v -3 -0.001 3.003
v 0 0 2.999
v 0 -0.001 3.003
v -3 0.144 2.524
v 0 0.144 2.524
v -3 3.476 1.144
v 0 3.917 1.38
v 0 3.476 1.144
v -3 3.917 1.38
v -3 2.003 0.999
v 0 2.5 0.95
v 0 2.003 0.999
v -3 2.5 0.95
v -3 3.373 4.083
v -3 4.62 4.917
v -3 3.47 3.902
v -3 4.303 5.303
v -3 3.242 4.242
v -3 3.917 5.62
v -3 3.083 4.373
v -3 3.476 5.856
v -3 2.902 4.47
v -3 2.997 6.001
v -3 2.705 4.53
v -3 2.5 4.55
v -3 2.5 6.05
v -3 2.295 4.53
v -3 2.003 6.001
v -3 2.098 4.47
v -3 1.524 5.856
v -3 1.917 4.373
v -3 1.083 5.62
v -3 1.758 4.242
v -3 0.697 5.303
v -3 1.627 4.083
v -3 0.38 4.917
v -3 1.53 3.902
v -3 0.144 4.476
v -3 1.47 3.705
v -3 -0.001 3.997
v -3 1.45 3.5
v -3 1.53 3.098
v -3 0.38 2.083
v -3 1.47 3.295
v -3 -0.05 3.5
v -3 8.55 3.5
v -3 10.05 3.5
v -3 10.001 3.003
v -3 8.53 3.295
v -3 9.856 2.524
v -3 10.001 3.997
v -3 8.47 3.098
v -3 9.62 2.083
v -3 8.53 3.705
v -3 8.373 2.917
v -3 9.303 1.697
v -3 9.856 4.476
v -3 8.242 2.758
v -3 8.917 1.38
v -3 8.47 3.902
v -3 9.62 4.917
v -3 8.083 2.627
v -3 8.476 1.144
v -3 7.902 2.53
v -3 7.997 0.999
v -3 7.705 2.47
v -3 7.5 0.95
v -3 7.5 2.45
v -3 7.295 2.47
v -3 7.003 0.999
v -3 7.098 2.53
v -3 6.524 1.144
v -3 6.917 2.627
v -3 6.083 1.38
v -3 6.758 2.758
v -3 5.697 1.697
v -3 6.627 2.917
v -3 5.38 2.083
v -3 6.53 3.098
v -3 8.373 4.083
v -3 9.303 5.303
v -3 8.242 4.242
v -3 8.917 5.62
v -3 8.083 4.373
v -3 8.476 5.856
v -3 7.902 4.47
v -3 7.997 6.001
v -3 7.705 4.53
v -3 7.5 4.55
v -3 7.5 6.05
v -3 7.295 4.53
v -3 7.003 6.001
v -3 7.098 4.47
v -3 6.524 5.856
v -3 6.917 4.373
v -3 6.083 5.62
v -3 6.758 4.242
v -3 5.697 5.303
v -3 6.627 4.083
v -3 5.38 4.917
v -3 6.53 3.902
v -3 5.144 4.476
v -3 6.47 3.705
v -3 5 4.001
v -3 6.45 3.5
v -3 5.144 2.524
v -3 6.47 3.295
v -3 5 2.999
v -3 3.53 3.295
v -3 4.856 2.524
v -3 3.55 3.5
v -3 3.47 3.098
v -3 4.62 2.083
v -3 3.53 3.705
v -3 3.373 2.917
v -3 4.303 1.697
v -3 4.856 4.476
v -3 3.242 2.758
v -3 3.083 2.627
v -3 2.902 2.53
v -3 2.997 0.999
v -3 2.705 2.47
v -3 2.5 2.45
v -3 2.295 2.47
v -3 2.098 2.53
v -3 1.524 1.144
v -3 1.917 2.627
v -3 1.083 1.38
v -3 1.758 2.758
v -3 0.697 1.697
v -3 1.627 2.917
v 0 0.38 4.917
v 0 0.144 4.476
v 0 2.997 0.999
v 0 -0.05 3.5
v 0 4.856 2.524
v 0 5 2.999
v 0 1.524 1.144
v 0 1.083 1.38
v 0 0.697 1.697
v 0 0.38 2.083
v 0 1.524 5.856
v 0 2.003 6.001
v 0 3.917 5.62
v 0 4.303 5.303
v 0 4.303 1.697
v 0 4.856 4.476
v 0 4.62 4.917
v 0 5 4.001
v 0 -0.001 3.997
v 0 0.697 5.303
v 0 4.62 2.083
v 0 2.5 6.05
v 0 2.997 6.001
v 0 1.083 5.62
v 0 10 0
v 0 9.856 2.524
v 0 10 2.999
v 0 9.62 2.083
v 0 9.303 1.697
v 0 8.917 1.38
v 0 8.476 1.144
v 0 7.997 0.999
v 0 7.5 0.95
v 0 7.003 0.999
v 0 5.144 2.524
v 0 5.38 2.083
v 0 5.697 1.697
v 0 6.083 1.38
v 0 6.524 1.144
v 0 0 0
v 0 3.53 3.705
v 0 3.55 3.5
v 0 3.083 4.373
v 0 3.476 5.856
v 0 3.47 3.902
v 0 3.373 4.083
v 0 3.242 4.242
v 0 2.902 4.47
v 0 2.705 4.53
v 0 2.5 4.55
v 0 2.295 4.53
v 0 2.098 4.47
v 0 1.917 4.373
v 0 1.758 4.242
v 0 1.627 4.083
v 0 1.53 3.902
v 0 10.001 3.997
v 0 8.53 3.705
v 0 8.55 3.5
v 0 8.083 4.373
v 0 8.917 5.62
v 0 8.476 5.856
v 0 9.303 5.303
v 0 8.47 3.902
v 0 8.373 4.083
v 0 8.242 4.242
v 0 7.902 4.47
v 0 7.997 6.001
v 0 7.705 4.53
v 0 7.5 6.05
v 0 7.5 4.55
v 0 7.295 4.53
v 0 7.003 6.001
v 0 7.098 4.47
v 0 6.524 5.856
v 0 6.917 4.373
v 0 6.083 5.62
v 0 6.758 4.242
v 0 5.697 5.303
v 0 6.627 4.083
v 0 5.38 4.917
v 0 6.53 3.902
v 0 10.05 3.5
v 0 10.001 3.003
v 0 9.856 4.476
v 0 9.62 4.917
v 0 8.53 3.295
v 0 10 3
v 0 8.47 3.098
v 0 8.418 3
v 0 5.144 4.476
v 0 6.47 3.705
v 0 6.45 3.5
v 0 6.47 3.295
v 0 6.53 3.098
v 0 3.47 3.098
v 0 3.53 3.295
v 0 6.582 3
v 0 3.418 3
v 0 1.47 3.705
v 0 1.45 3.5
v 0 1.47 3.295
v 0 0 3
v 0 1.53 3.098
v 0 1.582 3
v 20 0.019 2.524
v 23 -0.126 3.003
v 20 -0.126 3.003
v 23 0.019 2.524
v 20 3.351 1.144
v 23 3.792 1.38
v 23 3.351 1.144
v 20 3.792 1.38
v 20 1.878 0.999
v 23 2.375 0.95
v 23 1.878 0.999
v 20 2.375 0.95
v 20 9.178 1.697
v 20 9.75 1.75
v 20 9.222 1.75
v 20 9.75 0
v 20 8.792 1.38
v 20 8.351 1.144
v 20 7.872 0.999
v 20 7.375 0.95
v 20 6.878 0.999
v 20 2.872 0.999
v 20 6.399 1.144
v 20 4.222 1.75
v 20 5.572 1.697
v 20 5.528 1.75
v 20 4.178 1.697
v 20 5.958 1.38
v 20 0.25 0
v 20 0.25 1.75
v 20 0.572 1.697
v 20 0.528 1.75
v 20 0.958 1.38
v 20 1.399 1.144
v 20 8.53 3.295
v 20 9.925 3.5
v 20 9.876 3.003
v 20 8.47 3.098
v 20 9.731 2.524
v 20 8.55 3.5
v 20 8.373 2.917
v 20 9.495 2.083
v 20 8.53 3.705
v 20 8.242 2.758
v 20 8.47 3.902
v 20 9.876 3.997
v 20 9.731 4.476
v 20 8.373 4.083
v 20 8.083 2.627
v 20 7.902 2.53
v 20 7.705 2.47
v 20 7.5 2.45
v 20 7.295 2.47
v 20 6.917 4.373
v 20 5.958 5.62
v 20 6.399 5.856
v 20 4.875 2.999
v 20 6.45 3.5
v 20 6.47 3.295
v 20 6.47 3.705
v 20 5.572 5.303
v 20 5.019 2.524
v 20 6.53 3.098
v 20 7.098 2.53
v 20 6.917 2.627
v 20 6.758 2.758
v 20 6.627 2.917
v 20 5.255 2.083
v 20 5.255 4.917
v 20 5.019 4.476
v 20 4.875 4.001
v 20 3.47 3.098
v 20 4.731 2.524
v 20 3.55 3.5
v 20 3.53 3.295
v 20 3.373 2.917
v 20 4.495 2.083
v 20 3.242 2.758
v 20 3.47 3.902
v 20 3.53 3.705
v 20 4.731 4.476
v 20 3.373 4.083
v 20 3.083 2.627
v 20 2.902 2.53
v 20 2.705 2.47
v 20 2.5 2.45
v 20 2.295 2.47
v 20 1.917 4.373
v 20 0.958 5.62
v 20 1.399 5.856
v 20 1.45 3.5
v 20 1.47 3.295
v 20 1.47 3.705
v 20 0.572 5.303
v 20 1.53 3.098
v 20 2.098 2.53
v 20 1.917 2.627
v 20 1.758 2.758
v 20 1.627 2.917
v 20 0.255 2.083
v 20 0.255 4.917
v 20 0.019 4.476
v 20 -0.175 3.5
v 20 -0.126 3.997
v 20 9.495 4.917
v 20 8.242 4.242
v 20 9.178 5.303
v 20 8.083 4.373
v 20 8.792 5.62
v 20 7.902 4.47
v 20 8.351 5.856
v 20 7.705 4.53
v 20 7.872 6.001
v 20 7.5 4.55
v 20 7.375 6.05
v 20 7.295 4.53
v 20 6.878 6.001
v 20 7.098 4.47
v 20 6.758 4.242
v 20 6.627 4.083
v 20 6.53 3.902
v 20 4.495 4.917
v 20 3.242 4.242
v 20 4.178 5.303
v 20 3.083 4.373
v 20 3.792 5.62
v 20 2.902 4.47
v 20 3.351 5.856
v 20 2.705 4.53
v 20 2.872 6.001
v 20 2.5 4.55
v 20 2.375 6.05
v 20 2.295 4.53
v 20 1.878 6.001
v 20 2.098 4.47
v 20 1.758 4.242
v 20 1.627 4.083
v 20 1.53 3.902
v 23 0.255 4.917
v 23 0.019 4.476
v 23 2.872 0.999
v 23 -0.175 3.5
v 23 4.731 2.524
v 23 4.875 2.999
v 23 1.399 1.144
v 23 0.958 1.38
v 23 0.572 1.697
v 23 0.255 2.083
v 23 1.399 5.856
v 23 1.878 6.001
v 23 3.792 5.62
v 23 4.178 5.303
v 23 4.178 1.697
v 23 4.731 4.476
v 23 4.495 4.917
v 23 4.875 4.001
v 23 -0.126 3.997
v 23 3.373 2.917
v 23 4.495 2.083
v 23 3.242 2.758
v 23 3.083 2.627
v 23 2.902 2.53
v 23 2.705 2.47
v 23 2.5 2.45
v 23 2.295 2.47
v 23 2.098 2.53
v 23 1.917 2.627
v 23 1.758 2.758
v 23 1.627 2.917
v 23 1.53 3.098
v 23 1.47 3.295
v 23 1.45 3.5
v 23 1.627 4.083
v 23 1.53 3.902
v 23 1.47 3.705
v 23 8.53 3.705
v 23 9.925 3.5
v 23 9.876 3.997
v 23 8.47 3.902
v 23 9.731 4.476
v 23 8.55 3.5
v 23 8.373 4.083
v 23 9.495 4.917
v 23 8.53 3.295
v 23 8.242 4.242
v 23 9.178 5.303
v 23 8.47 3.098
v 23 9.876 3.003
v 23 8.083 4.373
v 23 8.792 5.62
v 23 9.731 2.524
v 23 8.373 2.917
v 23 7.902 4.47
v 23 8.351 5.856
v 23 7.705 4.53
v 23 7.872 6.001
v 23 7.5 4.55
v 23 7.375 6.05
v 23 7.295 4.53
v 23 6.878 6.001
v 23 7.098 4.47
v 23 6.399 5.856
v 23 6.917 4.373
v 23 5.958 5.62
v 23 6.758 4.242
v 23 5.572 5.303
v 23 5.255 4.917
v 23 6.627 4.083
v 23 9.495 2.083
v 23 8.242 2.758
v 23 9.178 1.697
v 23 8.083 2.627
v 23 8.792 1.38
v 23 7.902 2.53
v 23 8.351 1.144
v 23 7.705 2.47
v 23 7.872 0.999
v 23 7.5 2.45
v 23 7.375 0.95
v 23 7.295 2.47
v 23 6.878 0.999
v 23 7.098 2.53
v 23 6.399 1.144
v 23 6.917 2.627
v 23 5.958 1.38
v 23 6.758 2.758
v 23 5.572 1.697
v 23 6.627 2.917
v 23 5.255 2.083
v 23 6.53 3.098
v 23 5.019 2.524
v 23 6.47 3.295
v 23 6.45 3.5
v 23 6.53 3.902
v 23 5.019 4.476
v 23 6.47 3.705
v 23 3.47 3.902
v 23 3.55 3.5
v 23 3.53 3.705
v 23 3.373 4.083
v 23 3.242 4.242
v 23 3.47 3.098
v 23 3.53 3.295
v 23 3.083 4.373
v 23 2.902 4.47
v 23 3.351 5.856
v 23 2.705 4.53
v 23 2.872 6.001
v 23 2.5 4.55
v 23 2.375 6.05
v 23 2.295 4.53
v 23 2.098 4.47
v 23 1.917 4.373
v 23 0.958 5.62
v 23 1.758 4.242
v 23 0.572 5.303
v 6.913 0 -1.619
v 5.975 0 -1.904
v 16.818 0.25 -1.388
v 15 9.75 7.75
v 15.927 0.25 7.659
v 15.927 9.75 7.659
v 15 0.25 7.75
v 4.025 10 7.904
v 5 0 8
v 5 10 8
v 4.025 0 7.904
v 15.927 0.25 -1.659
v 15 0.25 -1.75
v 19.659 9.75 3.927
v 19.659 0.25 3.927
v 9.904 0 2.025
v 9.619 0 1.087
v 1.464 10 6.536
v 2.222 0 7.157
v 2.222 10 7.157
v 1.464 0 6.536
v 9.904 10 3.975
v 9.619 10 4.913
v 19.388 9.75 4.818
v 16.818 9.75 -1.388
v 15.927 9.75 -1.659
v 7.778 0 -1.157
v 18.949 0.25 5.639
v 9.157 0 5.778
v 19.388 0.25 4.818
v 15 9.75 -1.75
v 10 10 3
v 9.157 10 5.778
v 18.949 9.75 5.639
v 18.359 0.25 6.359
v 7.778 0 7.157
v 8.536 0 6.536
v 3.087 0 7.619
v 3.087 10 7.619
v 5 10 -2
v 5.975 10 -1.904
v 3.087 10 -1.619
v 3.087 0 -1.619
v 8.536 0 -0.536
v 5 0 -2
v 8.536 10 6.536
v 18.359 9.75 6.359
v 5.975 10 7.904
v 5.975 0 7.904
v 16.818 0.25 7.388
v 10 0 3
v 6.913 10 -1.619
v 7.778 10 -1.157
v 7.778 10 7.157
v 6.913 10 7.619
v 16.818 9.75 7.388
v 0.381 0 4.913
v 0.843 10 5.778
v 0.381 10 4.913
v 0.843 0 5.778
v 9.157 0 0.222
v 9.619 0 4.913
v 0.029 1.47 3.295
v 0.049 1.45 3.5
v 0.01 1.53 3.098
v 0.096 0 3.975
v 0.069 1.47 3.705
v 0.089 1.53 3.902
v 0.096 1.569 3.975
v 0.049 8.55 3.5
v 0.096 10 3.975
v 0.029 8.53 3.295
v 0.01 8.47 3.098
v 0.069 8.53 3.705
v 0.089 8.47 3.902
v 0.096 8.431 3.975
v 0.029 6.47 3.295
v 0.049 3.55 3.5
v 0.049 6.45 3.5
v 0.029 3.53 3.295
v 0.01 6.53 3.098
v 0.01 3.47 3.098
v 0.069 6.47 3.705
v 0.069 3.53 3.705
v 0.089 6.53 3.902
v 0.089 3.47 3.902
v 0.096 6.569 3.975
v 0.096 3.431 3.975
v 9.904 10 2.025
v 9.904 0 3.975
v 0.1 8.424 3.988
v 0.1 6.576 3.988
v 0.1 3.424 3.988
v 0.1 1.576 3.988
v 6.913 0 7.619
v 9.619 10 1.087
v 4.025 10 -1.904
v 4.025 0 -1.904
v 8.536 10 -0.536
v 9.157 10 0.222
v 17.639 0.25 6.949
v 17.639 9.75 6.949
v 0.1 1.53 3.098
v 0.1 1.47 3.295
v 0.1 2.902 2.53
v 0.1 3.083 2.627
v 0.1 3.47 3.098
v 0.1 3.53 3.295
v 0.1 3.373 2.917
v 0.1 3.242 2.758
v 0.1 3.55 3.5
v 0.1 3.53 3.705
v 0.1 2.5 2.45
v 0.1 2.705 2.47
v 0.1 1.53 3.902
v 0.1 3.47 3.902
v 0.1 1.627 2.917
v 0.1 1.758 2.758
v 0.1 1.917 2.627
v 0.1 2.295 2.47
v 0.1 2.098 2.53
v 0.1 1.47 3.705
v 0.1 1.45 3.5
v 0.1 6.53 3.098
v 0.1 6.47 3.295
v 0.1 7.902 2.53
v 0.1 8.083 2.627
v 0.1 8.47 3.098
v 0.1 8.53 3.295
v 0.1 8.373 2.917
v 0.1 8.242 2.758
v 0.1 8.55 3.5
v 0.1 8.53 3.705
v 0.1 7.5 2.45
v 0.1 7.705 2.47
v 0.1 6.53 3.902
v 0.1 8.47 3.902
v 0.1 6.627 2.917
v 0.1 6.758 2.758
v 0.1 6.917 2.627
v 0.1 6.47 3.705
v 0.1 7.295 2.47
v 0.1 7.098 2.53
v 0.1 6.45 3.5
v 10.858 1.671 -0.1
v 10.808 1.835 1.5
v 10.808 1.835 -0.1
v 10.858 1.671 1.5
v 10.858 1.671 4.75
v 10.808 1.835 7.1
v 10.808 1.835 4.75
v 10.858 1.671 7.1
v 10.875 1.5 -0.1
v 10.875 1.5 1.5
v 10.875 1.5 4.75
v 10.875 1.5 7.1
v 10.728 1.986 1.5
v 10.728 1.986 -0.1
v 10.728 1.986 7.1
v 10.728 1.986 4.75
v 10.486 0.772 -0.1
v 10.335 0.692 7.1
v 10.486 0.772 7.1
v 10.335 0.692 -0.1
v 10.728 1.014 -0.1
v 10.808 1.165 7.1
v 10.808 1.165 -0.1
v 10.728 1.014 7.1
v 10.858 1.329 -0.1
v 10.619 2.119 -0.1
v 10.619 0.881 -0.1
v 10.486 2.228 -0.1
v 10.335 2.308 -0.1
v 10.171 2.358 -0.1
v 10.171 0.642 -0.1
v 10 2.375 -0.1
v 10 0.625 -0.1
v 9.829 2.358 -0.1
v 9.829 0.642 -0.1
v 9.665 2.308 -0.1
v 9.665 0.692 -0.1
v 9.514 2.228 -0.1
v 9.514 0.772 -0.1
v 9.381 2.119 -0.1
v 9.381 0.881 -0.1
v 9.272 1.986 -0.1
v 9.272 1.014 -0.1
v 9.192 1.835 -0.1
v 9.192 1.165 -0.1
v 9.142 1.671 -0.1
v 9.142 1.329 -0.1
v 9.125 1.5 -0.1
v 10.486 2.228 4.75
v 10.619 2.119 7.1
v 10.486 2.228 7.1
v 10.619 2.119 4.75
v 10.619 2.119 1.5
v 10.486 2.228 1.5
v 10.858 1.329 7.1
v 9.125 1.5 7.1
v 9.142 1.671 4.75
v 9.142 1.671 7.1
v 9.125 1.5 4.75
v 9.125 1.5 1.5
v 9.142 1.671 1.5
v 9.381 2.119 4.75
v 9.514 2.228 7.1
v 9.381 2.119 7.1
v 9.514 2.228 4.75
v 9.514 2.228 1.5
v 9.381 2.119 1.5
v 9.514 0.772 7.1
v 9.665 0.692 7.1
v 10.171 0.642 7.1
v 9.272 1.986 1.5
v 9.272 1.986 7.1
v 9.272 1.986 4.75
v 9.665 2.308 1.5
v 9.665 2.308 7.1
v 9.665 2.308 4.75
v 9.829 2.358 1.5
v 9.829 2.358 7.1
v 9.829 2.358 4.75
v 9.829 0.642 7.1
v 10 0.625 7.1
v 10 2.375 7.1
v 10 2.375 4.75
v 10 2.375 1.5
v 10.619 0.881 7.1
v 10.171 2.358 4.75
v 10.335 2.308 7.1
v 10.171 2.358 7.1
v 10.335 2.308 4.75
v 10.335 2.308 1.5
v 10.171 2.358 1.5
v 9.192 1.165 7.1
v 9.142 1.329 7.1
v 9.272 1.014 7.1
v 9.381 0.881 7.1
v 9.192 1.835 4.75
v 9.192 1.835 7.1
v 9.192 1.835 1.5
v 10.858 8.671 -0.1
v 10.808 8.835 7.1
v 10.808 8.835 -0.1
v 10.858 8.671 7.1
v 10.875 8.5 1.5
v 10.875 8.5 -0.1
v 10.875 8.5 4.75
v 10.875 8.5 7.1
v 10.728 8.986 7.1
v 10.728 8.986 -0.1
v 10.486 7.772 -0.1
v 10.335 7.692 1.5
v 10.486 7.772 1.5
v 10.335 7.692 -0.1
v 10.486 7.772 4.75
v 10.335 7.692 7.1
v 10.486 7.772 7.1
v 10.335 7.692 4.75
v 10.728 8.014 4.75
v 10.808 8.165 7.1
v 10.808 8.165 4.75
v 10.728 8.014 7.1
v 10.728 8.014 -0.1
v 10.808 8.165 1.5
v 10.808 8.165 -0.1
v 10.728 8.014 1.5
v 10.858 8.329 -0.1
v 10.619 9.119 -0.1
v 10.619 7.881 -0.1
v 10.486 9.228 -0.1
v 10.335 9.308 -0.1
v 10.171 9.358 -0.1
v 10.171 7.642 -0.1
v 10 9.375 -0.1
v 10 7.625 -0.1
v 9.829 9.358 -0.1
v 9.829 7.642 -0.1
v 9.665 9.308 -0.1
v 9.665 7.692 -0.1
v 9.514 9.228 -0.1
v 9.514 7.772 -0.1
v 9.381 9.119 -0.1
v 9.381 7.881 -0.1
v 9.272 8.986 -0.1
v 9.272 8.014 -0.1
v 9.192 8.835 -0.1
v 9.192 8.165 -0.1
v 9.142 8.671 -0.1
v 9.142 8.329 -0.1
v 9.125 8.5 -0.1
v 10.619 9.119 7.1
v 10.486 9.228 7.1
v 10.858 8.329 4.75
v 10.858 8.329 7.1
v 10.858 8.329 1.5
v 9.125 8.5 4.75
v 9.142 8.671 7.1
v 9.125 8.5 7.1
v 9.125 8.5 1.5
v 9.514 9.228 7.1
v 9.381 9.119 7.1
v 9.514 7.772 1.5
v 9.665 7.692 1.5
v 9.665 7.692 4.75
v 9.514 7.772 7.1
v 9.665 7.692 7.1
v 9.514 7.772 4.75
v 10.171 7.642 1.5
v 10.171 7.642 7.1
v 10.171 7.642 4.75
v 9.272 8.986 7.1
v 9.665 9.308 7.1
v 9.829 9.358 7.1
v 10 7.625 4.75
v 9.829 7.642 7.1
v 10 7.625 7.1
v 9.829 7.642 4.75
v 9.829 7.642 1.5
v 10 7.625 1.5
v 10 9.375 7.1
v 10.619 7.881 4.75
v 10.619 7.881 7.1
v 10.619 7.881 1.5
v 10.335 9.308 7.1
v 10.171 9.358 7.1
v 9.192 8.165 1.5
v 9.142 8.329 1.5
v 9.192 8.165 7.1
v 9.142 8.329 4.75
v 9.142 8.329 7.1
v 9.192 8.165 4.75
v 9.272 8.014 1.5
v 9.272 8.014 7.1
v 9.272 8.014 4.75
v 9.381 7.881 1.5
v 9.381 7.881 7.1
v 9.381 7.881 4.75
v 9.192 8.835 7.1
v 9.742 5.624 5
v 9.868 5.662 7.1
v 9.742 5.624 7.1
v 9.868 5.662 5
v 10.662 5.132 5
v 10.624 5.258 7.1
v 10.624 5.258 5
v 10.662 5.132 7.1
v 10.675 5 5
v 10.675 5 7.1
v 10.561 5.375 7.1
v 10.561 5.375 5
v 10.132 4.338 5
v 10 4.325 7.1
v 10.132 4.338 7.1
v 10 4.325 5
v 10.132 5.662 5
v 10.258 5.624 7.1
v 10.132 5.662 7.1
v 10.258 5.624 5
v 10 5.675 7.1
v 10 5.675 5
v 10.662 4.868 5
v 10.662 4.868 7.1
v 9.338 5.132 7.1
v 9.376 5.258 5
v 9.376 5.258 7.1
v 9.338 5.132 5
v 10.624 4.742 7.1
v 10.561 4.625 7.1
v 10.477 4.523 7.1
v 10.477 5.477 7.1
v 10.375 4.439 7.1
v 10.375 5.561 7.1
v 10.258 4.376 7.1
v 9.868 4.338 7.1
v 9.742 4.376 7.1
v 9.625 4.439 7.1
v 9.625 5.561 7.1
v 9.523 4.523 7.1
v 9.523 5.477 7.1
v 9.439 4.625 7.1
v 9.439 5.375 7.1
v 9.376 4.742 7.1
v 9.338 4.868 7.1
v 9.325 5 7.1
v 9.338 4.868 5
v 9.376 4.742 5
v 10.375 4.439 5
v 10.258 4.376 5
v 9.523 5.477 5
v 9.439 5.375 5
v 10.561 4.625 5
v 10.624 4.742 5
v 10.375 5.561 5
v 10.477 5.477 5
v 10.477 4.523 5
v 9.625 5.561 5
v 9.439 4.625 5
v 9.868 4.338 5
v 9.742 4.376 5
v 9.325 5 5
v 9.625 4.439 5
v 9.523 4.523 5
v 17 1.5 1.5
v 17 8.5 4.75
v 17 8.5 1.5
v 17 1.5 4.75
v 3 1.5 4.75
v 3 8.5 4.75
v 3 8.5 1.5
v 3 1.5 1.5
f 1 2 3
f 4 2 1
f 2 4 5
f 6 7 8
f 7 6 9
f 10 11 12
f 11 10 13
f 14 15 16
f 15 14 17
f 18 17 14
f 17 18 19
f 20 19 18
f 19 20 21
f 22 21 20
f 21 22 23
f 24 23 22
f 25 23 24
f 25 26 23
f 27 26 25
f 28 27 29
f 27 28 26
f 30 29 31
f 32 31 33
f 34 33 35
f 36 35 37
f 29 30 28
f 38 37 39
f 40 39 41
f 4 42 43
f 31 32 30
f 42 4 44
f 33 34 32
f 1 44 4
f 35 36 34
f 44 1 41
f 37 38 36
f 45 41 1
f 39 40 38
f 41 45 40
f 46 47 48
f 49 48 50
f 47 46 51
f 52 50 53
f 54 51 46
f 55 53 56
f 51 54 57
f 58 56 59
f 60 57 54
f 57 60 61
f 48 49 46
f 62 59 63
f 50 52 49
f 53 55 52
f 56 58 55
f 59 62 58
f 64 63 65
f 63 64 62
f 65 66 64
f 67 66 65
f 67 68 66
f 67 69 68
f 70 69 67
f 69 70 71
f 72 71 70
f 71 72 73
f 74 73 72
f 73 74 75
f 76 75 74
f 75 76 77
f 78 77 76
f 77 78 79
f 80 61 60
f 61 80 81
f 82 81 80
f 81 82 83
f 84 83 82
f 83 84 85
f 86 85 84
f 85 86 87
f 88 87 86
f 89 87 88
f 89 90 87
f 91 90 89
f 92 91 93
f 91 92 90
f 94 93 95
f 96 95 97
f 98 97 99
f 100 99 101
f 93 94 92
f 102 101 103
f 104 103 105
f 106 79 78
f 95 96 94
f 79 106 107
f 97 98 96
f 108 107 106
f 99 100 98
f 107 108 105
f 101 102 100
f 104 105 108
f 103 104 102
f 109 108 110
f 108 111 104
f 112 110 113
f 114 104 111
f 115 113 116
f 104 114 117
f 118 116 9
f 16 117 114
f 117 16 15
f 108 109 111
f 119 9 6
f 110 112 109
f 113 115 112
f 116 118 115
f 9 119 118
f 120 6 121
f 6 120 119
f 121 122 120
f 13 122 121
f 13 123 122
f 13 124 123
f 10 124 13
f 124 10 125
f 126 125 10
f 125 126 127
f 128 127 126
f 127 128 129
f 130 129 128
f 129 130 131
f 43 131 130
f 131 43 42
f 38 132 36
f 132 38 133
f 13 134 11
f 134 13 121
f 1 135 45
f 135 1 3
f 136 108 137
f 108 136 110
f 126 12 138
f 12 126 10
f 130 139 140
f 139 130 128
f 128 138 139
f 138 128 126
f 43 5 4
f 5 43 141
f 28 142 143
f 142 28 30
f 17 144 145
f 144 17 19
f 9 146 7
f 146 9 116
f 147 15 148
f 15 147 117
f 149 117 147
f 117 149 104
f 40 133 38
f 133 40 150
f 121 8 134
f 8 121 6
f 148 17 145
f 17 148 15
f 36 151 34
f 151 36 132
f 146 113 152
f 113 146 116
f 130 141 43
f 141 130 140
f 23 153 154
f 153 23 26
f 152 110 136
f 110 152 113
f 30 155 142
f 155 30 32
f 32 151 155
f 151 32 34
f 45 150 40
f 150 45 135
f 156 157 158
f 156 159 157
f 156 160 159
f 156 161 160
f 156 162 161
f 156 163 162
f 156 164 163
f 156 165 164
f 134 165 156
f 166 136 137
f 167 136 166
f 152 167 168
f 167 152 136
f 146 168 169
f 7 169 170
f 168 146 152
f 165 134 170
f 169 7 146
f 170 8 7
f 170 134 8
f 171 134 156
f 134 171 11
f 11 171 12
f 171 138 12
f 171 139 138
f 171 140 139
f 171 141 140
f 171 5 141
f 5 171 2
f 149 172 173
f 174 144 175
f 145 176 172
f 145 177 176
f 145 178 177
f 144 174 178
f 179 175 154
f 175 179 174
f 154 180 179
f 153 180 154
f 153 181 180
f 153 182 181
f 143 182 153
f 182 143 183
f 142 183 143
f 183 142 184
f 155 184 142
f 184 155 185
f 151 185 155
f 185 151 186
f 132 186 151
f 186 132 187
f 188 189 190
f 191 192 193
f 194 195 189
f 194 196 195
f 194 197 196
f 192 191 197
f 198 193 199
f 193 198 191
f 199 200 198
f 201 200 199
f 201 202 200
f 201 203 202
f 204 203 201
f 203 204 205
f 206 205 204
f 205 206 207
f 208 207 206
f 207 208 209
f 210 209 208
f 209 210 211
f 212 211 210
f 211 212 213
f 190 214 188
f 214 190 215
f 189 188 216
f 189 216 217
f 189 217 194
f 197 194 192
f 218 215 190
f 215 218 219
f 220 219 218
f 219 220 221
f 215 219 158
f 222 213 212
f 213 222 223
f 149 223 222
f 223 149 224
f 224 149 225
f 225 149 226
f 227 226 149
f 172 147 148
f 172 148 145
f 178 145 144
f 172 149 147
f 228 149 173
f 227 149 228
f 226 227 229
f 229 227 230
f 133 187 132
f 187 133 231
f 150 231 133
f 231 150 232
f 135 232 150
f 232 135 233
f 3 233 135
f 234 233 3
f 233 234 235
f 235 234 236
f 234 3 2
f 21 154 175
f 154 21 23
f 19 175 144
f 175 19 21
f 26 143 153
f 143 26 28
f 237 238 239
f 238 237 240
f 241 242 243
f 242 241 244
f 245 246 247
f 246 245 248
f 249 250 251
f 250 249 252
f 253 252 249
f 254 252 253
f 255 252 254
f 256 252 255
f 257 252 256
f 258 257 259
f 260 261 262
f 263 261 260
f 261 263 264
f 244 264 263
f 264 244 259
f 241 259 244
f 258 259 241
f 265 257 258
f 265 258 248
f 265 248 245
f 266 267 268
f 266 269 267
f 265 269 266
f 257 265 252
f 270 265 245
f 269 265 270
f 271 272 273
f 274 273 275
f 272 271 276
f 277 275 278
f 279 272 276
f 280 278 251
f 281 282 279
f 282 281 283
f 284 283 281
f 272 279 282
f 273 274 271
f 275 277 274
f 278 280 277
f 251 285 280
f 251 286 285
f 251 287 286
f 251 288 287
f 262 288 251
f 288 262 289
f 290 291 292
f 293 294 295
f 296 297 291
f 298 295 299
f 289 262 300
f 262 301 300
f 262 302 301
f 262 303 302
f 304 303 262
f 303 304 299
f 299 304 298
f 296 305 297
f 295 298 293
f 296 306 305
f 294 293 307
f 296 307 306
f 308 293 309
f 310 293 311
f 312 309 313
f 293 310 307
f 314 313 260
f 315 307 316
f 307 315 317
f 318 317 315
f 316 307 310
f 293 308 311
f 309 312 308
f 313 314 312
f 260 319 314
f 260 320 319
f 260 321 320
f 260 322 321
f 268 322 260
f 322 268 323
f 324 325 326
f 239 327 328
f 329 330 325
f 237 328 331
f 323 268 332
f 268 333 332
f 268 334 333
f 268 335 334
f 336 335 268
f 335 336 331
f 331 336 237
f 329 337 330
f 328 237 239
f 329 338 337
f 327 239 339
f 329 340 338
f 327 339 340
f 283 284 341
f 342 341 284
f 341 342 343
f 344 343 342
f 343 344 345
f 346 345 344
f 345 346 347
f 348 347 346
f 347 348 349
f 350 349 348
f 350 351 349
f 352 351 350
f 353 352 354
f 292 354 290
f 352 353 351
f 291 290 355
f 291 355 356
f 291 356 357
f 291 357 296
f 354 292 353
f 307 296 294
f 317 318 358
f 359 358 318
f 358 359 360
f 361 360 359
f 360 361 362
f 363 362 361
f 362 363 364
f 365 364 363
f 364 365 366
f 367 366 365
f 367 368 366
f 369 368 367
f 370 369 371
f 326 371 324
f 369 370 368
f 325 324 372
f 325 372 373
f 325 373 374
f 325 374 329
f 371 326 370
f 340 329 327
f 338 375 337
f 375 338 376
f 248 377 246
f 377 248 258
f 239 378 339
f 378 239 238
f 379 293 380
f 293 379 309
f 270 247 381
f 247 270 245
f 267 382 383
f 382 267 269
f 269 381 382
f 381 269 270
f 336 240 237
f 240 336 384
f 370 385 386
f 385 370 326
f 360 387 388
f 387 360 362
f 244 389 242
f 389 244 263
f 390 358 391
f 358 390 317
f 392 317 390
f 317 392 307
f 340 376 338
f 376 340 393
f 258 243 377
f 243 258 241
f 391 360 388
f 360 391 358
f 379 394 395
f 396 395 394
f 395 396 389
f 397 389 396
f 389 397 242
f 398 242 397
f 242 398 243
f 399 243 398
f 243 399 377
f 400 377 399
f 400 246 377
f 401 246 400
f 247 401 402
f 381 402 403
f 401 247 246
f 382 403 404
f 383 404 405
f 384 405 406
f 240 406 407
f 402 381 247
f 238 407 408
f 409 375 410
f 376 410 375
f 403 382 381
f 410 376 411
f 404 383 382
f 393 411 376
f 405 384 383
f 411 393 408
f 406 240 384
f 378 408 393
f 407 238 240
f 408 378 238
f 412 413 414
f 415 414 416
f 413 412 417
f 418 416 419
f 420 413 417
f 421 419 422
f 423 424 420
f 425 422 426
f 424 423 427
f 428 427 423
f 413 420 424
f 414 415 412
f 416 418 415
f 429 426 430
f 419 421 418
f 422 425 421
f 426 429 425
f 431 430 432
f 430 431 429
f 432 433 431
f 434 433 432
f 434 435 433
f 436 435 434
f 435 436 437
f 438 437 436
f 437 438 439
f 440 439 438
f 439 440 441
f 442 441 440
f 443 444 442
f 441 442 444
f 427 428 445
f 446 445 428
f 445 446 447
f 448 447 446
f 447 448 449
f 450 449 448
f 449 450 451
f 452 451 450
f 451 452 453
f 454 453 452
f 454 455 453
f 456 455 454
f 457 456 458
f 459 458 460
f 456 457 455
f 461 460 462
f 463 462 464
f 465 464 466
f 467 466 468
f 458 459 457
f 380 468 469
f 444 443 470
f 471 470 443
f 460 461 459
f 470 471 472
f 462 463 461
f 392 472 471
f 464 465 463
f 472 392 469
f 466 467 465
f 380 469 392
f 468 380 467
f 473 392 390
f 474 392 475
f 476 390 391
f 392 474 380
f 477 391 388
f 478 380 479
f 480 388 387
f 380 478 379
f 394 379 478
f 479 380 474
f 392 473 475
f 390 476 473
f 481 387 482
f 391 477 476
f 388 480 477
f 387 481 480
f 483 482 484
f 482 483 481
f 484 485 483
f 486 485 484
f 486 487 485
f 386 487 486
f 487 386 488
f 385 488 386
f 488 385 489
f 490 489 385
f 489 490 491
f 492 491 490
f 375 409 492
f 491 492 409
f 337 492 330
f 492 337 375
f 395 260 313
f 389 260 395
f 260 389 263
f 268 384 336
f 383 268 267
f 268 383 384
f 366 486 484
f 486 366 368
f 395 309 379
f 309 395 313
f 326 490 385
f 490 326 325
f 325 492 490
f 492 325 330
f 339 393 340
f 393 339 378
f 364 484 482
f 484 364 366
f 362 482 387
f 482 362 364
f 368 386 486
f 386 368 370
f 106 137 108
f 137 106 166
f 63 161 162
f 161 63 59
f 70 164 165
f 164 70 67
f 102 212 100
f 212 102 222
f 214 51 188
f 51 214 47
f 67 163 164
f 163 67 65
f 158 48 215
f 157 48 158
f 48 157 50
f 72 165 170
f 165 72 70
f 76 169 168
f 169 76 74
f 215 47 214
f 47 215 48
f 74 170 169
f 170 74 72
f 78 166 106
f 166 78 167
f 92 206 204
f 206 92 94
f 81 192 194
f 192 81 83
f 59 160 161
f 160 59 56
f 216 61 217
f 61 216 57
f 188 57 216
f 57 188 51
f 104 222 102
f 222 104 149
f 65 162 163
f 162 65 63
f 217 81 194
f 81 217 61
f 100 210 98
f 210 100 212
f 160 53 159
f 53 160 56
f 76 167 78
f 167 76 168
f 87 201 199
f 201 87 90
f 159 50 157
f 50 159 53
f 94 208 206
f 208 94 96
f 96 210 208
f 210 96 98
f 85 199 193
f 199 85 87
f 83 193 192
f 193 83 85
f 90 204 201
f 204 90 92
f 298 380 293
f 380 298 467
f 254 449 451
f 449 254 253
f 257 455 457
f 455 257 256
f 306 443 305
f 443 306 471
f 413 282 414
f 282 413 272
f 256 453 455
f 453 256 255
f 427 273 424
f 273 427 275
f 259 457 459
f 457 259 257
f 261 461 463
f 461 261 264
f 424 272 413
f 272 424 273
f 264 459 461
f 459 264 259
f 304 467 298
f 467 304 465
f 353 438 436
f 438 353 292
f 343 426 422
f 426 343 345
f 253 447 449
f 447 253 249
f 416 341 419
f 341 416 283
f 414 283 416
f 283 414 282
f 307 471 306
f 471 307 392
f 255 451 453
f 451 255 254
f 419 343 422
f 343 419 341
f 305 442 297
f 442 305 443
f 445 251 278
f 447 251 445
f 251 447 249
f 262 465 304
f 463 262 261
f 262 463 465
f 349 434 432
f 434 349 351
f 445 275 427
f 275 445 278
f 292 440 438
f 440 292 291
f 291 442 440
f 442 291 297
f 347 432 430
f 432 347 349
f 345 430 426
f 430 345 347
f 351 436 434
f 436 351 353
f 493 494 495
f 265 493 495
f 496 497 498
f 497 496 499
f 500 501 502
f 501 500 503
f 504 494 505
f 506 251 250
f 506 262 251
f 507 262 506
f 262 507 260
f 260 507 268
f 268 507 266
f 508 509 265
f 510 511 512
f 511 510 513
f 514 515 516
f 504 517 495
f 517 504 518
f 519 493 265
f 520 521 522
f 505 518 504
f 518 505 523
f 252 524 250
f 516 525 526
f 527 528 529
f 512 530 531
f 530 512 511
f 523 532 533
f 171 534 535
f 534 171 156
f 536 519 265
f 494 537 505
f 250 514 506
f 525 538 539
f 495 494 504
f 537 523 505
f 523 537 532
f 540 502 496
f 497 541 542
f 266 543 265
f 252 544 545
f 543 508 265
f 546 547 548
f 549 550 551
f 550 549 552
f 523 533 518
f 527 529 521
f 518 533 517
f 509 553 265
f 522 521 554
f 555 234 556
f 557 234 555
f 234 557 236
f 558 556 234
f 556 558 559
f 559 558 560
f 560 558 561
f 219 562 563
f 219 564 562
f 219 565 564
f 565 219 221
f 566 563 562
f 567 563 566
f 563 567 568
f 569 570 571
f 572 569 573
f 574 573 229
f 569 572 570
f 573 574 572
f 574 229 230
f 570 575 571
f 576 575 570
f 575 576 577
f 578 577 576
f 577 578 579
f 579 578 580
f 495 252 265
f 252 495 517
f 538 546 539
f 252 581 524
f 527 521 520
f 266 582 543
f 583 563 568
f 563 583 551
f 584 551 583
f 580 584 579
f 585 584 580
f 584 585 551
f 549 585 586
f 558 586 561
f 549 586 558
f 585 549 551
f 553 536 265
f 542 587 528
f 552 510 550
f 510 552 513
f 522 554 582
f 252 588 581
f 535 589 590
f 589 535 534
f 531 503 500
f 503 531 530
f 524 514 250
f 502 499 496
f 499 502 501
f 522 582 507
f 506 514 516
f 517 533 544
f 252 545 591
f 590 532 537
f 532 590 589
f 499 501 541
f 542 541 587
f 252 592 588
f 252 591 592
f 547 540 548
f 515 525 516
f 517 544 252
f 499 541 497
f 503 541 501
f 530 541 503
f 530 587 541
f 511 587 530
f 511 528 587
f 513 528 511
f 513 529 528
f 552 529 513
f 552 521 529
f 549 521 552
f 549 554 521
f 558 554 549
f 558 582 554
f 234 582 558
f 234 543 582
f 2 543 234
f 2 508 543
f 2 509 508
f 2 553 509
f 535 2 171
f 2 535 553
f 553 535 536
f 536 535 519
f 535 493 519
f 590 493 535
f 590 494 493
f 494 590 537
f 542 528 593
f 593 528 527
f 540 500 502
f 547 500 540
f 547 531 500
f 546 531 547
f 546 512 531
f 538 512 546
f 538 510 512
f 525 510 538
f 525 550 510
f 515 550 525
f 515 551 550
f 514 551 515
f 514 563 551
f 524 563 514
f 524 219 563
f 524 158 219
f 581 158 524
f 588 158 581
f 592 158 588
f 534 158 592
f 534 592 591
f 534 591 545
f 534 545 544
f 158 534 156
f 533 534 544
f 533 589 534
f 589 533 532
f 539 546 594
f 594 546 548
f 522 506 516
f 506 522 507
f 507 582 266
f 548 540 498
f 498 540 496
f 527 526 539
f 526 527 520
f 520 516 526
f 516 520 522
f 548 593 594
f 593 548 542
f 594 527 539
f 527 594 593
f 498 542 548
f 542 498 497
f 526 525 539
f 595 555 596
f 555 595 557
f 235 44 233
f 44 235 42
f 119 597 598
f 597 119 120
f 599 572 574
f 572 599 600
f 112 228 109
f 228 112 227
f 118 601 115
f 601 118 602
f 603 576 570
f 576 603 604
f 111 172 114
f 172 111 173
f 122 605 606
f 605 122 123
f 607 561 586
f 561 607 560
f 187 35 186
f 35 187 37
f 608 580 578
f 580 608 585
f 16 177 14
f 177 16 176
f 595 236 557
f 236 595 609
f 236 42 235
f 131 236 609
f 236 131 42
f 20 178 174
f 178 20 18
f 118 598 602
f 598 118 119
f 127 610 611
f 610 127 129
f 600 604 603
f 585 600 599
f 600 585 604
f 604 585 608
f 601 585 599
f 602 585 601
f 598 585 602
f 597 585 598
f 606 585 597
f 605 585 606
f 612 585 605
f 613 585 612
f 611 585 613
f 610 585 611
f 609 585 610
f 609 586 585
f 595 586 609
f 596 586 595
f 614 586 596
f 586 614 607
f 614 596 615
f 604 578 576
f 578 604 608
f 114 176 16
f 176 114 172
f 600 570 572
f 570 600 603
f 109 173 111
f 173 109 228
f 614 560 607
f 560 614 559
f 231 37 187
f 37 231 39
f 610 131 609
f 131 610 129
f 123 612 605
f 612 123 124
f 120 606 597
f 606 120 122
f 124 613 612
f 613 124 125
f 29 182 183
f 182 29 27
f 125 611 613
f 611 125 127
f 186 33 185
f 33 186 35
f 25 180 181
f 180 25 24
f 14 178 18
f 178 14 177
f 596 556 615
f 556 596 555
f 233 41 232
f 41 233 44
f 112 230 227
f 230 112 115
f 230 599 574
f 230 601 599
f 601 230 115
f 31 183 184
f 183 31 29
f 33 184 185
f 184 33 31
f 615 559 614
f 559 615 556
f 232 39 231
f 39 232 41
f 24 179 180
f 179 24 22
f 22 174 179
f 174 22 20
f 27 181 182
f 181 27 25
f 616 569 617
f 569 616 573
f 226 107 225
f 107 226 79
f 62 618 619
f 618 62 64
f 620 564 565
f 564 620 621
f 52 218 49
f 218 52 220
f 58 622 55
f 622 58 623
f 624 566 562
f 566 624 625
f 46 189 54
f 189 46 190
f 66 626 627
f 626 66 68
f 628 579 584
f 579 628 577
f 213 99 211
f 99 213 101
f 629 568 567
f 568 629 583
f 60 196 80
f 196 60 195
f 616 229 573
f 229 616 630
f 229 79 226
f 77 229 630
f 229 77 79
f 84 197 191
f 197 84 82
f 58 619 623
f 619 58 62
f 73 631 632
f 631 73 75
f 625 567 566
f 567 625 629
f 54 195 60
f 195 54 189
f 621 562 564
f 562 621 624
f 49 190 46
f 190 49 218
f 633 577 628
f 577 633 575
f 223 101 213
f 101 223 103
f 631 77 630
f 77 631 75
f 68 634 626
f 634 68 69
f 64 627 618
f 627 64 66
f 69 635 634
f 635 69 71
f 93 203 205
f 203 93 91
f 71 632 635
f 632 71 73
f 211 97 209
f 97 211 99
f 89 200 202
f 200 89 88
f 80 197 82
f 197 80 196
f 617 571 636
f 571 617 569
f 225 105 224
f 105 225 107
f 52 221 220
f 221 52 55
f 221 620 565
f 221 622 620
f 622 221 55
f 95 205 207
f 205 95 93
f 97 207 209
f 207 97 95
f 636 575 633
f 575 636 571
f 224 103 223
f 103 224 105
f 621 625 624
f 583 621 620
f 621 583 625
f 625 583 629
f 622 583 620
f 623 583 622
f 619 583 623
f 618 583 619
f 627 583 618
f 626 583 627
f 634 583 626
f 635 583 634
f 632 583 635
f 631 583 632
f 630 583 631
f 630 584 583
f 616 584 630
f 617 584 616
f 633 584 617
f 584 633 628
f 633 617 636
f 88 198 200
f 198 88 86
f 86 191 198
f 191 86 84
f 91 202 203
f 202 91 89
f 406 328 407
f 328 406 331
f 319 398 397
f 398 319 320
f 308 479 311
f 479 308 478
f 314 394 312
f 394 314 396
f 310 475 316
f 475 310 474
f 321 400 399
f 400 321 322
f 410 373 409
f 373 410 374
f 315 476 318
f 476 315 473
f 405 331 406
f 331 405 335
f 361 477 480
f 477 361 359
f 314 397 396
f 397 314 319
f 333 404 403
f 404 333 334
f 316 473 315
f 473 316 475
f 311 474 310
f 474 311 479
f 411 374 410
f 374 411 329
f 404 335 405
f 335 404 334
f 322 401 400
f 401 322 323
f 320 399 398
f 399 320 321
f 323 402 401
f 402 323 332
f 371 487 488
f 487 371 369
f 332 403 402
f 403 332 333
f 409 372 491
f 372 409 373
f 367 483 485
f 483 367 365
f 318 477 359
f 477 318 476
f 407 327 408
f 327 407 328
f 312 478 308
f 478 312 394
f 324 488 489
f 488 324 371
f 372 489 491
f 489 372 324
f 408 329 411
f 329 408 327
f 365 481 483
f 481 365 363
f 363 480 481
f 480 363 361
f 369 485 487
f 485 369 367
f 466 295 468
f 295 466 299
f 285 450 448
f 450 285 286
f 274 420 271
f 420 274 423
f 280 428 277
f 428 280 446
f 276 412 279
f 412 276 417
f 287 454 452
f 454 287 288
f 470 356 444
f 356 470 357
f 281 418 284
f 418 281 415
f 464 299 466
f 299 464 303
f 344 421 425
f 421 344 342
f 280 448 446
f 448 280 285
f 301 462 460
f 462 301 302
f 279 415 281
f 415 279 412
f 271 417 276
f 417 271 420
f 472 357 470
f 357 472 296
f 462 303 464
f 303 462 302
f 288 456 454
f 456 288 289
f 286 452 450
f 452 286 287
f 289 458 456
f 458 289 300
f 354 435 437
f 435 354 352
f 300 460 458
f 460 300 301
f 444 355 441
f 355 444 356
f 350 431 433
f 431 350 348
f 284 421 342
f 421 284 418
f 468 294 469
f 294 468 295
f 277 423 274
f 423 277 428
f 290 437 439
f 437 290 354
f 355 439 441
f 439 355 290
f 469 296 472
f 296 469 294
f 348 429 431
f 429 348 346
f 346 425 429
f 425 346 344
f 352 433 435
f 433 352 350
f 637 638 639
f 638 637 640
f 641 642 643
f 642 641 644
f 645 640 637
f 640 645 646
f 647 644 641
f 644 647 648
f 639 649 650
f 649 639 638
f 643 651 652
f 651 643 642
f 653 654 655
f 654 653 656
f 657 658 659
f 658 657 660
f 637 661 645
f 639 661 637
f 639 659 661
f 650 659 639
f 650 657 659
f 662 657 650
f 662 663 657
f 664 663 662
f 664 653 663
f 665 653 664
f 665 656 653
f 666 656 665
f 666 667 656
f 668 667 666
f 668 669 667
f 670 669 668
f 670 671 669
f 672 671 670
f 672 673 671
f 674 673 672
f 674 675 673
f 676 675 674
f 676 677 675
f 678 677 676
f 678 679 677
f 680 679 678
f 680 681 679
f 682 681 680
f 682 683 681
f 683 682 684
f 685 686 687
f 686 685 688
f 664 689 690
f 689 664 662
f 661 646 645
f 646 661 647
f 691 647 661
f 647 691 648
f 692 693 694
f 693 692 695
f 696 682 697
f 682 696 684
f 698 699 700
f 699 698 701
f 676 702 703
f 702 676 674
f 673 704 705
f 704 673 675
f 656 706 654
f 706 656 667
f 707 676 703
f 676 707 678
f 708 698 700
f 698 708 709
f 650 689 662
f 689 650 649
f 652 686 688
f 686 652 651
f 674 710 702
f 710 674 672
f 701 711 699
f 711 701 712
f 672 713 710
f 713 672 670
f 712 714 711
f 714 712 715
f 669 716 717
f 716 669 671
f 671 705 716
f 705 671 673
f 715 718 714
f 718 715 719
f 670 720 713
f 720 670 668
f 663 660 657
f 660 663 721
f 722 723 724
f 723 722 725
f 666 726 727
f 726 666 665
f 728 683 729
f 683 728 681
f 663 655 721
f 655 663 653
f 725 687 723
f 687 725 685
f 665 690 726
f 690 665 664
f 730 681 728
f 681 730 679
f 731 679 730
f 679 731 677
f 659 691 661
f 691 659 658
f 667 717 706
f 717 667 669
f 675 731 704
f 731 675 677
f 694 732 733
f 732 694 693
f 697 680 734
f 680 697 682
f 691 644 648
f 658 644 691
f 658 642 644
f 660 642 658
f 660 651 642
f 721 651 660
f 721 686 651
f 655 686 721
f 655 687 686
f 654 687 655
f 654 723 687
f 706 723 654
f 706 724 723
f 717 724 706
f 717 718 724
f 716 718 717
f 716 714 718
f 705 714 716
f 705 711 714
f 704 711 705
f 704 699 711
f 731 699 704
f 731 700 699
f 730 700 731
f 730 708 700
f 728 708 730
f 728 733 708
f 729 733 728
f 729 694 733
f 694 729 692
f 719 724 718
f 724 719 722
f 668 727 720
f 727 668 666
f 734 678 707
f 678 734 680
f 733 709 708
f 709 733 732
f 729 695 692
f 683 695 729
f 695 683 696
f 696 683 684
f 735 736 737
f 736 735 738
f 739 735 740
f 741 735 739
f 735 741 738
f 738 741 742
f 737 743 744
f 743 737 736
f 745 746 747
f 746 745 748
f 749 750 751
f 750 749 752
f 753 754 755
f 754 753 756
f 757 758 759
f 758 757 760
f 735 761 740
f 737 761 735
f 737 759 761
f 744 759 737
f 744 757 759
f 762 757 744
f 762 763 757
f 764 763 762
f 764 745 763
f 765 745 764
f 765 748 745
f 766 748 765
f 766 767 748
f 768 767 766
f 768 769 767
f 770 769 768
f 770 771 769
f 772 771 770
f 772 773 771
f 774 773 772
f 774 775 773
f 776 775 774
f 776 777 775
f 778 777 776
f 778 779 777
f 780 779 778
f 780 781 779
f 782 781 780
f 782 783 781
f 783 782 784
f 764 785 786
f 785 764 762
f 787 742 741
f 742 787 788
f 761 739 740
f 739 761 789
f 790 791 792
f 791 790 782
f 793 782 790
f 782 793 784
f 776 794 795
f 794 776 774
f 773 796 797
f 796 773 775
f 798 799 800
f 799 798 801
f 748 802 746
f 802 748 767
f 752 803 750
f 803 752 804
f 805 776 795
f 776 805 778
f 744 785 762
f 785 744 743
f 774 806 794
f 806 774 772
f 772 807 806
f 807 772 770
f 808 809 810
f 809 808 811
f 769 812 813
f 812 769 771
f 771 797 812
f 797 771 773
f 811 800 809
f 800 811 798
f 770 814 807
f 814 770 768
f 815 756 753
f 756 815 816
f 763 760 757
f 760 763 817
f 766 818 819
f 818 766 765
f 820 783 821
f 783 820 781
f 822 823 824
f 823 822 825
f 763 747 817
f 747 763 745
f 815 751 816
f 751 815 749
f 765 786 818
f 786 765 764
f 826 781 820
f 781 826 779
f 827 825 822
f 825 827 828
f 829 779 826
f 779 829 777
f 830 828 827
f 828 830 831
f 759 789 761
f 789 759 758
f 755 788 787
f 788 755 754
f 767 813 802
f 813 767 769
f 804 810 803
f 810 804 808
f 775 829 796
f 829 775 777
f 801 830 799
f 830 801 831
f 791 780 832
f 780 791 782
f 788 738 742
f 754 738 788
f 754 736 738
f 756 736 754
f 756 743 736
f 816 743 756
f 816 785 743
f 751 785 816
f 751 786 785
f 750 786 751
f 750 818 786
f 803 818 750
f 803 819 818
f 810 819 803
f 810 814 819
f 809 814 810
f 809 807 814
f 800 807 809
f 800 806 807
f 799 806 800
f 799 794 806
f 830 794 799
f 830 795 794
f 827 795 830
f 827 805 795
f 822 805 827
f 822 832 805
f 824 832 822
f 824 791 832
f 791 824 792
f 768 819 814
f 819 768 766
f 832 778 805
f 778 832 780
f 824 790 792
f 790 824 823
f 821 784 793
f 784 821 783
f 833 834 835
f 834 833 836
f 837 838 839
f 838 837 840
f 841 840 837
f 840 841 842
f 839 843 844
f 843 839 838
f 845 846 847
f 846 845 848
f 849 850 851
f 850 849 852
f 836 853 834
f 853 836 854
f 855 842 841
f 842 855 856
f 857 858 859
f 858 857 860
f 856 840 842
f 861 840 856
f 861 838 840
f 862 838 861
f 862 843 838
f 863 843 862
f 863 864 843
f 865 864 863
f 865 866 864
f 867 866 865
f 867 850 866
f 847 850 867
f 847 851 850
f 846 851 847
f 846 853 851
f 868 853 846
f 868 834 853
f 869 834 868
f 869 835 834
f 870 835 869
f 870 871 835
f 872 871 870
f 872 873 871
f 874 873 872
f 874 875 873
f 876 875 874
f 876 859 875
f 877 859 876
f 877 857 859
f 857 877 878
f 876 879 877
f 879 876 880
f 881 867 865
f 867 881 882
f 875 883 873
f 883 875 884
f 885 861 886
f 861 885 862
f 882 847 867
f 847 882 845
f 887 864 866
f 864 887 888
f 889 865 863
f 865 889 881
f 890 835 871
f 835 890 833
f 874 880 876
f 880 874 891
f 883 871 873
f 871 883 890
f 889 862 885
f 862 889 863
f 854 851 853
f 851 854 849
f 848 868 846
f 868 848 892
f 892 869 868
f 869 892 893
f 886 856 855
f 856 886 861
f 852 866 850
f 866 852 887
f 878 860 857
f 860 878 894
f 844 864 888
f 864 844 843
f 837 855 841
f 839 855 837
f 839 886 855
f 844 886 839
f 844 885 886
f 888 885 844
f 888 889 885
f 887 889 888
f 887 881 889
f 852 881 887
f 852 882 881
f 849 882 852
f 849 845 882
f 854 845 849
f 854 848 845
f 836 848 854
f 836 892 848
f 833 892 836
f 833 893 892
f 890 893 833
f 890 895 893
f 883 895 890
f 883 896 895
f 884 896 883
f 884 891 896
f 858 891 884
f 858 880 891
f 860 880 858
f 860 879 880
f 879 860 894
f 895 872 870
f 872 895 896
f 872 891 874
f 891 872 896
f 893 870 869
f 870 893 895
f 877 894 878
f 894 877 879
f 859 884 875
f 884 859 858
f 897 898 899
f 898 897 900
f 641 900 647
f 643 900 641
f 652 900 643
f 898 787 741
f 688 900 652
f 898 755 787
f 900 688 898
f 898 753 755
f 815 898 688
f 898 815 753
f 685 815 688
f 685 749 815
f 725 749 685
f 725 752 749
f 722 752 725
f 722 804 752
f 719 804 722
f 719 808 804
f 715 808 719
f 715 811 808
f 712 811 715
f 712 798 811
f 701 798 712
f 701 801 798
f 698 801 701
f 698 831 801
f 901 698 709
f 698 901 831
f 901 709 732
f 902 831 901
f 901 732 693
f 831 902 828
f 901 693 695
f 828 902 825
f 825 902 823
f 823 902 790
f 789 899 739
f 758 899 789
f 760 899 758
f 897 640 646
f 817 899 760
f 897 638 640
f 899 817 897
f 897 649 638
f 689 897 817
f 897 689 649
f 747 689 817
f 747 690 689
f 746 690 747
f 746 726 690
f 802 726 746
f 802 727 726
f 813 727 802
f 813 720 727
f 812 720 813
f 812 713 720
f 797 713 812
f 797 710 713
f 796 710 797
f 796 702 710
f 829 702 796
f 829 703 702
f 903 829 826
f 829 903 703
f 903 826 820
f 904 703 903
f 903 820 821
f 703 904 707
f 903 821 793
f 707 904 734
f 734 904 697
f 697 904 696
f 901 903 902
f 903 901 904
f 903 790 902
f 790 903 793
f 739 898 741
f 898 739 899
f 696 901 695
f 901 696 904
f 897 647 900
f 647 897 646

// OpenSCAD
// ============================================================
// finger_segment_middle.scad
// Middle Finger Segment – Humanoid Welcoming Robot
// Identical geometry to proximal but with tapered/reduced mass
//
// Print Settings:
//   Material:    PLA
//   Infill:      15%
//   Layer height: 0.2 mm
//   Supports:    None required
//   Weight:      ~3 g
//   Print time:  ~2.5 minutes
// ============================================================

$fn = 32;
$fa = 6;
$fs = 1;

// --- Parametric Variables ---
length                = 20;   // mm  segment length
width                 = 10;   // mm  segment width
thickness             = 7;    // mm  segment thickness
hinge_pin_diameter    = 2;    // mm  hinge pin outer diameter
hinge_pin_bore        = 2.1;  // mm  hinge hole diameter (0.1 mm tolerance)
tendon_hole_diameter  = 1.35; // mm  tendon hole (top face)
elastic_hole_diameter = 1.75; // mm  elastic band holes (bottom face)
elastic_hole_spacing  = 7;    // mm  distance between two bottom holes
outer_radius          = 5;    // mm  dorsal curvature radius
wall_min              = 1.5;  // mm  minimum wall thickness

// Taper: middle segment is slightly narrower at the distal end
taper_amount = 0.5;           // mm  width reduction at distal end

// Derived
hinge_boss_od    = hinge_pin_bore + wall_min * 2;
hinge_boss_depth = 3.0;

// ============================================================
// Module: segment_body_tapered
// Slightly tapered body for reduced mass
// ============================================================
module segment_body_tapered() {
    hull() {
        // Proximal (palm) end – full width
        translate([0, 0, 0])
            cube([1, width, thickness / 4]);
        translate([outer_radius, width / 2, thickness - outer_radius + 1])
            rotate([90, 0, 0])
                cylinder(r = outer_radius, h = width, center = true);
        // Distal end – slightly tapered
        translate([length - 1, taper_amount / 2, 0])
            cube([1, width - taper_amount, thickness / 4]);
        translate([length - outer_radius,
                   width / 2,
                   thickness - outer_radius + 1])
            rotate([90, 0, 0])
                cylinder(r = outer_radius - taper_amount / 2,
                         h = width - taper_amount, center = true);
    }
}

// ============================================================
// Module: hinge_bosses
// ============================================================
module hinge_bosses() {
    for (y_pos = [width * 0.25, width * 0.75]) {
        // Proximal boss (solid)
        translate([-hinge_boss_depth, y_pos, thickness / 2])
            rotate([0, 90, 0])
                cylinder(d = hinge_boss_od, h = hinge_boss_depth);
        // Distal boss
        translate([length, y_pos - taper_amount / 4, thickness / 2])
            rotate([0, 90, 0])
                cylinder(d = hinge_boss_od, h = hinge_boss_depth);
    }
}

// ============================================================
// Module: finger_segment_middle
// ============================================================
module finger_segment_middle() {
    difference() {
        union() {
            segment_body_tapered();
            hinge_bosses();
        }
        // Hinge pin bores (both ends)
        for (x_pos = [-hinge_boss_depth - 0.1, length - 0.1])
            for (y_pos = [width * 0.25, width * 0.75])
                translate([x_pos, y_pos, thickness / 2])
                    rotate([0, 90, 0])
                        cylinder(d = hinge_pin_bore, h = hinge_boss_depth + 0.2);
        // Tendon hole (top face, 2 mm from surface)
        translate([length / 2, width / 2, thickness - 2])
            cylinder(d = tendon_hole_diameter, h = 2.1);
        // Elastic holes (bottom face)
        for (dy = [-elastic_hole_spacing / 2, elastic_hole_spacing / 2])
            translate([length / 2, width / 2 + dy, -0.1])
                cylinder(d = elastic_hole_diameter, h = thickness + 0.2);
        // Internal lightening cavity
        translate([wall_min * 2, wall_min, wall_min])
            cube([length - wall_min * 4,
                  width  - wall_min * 2,
                  thickness - wall_min * 2.5]);
    }
}

// ============================================================
// Render
// ============================================================
color("CornflowerBlue")
    finger_segment_middle();
